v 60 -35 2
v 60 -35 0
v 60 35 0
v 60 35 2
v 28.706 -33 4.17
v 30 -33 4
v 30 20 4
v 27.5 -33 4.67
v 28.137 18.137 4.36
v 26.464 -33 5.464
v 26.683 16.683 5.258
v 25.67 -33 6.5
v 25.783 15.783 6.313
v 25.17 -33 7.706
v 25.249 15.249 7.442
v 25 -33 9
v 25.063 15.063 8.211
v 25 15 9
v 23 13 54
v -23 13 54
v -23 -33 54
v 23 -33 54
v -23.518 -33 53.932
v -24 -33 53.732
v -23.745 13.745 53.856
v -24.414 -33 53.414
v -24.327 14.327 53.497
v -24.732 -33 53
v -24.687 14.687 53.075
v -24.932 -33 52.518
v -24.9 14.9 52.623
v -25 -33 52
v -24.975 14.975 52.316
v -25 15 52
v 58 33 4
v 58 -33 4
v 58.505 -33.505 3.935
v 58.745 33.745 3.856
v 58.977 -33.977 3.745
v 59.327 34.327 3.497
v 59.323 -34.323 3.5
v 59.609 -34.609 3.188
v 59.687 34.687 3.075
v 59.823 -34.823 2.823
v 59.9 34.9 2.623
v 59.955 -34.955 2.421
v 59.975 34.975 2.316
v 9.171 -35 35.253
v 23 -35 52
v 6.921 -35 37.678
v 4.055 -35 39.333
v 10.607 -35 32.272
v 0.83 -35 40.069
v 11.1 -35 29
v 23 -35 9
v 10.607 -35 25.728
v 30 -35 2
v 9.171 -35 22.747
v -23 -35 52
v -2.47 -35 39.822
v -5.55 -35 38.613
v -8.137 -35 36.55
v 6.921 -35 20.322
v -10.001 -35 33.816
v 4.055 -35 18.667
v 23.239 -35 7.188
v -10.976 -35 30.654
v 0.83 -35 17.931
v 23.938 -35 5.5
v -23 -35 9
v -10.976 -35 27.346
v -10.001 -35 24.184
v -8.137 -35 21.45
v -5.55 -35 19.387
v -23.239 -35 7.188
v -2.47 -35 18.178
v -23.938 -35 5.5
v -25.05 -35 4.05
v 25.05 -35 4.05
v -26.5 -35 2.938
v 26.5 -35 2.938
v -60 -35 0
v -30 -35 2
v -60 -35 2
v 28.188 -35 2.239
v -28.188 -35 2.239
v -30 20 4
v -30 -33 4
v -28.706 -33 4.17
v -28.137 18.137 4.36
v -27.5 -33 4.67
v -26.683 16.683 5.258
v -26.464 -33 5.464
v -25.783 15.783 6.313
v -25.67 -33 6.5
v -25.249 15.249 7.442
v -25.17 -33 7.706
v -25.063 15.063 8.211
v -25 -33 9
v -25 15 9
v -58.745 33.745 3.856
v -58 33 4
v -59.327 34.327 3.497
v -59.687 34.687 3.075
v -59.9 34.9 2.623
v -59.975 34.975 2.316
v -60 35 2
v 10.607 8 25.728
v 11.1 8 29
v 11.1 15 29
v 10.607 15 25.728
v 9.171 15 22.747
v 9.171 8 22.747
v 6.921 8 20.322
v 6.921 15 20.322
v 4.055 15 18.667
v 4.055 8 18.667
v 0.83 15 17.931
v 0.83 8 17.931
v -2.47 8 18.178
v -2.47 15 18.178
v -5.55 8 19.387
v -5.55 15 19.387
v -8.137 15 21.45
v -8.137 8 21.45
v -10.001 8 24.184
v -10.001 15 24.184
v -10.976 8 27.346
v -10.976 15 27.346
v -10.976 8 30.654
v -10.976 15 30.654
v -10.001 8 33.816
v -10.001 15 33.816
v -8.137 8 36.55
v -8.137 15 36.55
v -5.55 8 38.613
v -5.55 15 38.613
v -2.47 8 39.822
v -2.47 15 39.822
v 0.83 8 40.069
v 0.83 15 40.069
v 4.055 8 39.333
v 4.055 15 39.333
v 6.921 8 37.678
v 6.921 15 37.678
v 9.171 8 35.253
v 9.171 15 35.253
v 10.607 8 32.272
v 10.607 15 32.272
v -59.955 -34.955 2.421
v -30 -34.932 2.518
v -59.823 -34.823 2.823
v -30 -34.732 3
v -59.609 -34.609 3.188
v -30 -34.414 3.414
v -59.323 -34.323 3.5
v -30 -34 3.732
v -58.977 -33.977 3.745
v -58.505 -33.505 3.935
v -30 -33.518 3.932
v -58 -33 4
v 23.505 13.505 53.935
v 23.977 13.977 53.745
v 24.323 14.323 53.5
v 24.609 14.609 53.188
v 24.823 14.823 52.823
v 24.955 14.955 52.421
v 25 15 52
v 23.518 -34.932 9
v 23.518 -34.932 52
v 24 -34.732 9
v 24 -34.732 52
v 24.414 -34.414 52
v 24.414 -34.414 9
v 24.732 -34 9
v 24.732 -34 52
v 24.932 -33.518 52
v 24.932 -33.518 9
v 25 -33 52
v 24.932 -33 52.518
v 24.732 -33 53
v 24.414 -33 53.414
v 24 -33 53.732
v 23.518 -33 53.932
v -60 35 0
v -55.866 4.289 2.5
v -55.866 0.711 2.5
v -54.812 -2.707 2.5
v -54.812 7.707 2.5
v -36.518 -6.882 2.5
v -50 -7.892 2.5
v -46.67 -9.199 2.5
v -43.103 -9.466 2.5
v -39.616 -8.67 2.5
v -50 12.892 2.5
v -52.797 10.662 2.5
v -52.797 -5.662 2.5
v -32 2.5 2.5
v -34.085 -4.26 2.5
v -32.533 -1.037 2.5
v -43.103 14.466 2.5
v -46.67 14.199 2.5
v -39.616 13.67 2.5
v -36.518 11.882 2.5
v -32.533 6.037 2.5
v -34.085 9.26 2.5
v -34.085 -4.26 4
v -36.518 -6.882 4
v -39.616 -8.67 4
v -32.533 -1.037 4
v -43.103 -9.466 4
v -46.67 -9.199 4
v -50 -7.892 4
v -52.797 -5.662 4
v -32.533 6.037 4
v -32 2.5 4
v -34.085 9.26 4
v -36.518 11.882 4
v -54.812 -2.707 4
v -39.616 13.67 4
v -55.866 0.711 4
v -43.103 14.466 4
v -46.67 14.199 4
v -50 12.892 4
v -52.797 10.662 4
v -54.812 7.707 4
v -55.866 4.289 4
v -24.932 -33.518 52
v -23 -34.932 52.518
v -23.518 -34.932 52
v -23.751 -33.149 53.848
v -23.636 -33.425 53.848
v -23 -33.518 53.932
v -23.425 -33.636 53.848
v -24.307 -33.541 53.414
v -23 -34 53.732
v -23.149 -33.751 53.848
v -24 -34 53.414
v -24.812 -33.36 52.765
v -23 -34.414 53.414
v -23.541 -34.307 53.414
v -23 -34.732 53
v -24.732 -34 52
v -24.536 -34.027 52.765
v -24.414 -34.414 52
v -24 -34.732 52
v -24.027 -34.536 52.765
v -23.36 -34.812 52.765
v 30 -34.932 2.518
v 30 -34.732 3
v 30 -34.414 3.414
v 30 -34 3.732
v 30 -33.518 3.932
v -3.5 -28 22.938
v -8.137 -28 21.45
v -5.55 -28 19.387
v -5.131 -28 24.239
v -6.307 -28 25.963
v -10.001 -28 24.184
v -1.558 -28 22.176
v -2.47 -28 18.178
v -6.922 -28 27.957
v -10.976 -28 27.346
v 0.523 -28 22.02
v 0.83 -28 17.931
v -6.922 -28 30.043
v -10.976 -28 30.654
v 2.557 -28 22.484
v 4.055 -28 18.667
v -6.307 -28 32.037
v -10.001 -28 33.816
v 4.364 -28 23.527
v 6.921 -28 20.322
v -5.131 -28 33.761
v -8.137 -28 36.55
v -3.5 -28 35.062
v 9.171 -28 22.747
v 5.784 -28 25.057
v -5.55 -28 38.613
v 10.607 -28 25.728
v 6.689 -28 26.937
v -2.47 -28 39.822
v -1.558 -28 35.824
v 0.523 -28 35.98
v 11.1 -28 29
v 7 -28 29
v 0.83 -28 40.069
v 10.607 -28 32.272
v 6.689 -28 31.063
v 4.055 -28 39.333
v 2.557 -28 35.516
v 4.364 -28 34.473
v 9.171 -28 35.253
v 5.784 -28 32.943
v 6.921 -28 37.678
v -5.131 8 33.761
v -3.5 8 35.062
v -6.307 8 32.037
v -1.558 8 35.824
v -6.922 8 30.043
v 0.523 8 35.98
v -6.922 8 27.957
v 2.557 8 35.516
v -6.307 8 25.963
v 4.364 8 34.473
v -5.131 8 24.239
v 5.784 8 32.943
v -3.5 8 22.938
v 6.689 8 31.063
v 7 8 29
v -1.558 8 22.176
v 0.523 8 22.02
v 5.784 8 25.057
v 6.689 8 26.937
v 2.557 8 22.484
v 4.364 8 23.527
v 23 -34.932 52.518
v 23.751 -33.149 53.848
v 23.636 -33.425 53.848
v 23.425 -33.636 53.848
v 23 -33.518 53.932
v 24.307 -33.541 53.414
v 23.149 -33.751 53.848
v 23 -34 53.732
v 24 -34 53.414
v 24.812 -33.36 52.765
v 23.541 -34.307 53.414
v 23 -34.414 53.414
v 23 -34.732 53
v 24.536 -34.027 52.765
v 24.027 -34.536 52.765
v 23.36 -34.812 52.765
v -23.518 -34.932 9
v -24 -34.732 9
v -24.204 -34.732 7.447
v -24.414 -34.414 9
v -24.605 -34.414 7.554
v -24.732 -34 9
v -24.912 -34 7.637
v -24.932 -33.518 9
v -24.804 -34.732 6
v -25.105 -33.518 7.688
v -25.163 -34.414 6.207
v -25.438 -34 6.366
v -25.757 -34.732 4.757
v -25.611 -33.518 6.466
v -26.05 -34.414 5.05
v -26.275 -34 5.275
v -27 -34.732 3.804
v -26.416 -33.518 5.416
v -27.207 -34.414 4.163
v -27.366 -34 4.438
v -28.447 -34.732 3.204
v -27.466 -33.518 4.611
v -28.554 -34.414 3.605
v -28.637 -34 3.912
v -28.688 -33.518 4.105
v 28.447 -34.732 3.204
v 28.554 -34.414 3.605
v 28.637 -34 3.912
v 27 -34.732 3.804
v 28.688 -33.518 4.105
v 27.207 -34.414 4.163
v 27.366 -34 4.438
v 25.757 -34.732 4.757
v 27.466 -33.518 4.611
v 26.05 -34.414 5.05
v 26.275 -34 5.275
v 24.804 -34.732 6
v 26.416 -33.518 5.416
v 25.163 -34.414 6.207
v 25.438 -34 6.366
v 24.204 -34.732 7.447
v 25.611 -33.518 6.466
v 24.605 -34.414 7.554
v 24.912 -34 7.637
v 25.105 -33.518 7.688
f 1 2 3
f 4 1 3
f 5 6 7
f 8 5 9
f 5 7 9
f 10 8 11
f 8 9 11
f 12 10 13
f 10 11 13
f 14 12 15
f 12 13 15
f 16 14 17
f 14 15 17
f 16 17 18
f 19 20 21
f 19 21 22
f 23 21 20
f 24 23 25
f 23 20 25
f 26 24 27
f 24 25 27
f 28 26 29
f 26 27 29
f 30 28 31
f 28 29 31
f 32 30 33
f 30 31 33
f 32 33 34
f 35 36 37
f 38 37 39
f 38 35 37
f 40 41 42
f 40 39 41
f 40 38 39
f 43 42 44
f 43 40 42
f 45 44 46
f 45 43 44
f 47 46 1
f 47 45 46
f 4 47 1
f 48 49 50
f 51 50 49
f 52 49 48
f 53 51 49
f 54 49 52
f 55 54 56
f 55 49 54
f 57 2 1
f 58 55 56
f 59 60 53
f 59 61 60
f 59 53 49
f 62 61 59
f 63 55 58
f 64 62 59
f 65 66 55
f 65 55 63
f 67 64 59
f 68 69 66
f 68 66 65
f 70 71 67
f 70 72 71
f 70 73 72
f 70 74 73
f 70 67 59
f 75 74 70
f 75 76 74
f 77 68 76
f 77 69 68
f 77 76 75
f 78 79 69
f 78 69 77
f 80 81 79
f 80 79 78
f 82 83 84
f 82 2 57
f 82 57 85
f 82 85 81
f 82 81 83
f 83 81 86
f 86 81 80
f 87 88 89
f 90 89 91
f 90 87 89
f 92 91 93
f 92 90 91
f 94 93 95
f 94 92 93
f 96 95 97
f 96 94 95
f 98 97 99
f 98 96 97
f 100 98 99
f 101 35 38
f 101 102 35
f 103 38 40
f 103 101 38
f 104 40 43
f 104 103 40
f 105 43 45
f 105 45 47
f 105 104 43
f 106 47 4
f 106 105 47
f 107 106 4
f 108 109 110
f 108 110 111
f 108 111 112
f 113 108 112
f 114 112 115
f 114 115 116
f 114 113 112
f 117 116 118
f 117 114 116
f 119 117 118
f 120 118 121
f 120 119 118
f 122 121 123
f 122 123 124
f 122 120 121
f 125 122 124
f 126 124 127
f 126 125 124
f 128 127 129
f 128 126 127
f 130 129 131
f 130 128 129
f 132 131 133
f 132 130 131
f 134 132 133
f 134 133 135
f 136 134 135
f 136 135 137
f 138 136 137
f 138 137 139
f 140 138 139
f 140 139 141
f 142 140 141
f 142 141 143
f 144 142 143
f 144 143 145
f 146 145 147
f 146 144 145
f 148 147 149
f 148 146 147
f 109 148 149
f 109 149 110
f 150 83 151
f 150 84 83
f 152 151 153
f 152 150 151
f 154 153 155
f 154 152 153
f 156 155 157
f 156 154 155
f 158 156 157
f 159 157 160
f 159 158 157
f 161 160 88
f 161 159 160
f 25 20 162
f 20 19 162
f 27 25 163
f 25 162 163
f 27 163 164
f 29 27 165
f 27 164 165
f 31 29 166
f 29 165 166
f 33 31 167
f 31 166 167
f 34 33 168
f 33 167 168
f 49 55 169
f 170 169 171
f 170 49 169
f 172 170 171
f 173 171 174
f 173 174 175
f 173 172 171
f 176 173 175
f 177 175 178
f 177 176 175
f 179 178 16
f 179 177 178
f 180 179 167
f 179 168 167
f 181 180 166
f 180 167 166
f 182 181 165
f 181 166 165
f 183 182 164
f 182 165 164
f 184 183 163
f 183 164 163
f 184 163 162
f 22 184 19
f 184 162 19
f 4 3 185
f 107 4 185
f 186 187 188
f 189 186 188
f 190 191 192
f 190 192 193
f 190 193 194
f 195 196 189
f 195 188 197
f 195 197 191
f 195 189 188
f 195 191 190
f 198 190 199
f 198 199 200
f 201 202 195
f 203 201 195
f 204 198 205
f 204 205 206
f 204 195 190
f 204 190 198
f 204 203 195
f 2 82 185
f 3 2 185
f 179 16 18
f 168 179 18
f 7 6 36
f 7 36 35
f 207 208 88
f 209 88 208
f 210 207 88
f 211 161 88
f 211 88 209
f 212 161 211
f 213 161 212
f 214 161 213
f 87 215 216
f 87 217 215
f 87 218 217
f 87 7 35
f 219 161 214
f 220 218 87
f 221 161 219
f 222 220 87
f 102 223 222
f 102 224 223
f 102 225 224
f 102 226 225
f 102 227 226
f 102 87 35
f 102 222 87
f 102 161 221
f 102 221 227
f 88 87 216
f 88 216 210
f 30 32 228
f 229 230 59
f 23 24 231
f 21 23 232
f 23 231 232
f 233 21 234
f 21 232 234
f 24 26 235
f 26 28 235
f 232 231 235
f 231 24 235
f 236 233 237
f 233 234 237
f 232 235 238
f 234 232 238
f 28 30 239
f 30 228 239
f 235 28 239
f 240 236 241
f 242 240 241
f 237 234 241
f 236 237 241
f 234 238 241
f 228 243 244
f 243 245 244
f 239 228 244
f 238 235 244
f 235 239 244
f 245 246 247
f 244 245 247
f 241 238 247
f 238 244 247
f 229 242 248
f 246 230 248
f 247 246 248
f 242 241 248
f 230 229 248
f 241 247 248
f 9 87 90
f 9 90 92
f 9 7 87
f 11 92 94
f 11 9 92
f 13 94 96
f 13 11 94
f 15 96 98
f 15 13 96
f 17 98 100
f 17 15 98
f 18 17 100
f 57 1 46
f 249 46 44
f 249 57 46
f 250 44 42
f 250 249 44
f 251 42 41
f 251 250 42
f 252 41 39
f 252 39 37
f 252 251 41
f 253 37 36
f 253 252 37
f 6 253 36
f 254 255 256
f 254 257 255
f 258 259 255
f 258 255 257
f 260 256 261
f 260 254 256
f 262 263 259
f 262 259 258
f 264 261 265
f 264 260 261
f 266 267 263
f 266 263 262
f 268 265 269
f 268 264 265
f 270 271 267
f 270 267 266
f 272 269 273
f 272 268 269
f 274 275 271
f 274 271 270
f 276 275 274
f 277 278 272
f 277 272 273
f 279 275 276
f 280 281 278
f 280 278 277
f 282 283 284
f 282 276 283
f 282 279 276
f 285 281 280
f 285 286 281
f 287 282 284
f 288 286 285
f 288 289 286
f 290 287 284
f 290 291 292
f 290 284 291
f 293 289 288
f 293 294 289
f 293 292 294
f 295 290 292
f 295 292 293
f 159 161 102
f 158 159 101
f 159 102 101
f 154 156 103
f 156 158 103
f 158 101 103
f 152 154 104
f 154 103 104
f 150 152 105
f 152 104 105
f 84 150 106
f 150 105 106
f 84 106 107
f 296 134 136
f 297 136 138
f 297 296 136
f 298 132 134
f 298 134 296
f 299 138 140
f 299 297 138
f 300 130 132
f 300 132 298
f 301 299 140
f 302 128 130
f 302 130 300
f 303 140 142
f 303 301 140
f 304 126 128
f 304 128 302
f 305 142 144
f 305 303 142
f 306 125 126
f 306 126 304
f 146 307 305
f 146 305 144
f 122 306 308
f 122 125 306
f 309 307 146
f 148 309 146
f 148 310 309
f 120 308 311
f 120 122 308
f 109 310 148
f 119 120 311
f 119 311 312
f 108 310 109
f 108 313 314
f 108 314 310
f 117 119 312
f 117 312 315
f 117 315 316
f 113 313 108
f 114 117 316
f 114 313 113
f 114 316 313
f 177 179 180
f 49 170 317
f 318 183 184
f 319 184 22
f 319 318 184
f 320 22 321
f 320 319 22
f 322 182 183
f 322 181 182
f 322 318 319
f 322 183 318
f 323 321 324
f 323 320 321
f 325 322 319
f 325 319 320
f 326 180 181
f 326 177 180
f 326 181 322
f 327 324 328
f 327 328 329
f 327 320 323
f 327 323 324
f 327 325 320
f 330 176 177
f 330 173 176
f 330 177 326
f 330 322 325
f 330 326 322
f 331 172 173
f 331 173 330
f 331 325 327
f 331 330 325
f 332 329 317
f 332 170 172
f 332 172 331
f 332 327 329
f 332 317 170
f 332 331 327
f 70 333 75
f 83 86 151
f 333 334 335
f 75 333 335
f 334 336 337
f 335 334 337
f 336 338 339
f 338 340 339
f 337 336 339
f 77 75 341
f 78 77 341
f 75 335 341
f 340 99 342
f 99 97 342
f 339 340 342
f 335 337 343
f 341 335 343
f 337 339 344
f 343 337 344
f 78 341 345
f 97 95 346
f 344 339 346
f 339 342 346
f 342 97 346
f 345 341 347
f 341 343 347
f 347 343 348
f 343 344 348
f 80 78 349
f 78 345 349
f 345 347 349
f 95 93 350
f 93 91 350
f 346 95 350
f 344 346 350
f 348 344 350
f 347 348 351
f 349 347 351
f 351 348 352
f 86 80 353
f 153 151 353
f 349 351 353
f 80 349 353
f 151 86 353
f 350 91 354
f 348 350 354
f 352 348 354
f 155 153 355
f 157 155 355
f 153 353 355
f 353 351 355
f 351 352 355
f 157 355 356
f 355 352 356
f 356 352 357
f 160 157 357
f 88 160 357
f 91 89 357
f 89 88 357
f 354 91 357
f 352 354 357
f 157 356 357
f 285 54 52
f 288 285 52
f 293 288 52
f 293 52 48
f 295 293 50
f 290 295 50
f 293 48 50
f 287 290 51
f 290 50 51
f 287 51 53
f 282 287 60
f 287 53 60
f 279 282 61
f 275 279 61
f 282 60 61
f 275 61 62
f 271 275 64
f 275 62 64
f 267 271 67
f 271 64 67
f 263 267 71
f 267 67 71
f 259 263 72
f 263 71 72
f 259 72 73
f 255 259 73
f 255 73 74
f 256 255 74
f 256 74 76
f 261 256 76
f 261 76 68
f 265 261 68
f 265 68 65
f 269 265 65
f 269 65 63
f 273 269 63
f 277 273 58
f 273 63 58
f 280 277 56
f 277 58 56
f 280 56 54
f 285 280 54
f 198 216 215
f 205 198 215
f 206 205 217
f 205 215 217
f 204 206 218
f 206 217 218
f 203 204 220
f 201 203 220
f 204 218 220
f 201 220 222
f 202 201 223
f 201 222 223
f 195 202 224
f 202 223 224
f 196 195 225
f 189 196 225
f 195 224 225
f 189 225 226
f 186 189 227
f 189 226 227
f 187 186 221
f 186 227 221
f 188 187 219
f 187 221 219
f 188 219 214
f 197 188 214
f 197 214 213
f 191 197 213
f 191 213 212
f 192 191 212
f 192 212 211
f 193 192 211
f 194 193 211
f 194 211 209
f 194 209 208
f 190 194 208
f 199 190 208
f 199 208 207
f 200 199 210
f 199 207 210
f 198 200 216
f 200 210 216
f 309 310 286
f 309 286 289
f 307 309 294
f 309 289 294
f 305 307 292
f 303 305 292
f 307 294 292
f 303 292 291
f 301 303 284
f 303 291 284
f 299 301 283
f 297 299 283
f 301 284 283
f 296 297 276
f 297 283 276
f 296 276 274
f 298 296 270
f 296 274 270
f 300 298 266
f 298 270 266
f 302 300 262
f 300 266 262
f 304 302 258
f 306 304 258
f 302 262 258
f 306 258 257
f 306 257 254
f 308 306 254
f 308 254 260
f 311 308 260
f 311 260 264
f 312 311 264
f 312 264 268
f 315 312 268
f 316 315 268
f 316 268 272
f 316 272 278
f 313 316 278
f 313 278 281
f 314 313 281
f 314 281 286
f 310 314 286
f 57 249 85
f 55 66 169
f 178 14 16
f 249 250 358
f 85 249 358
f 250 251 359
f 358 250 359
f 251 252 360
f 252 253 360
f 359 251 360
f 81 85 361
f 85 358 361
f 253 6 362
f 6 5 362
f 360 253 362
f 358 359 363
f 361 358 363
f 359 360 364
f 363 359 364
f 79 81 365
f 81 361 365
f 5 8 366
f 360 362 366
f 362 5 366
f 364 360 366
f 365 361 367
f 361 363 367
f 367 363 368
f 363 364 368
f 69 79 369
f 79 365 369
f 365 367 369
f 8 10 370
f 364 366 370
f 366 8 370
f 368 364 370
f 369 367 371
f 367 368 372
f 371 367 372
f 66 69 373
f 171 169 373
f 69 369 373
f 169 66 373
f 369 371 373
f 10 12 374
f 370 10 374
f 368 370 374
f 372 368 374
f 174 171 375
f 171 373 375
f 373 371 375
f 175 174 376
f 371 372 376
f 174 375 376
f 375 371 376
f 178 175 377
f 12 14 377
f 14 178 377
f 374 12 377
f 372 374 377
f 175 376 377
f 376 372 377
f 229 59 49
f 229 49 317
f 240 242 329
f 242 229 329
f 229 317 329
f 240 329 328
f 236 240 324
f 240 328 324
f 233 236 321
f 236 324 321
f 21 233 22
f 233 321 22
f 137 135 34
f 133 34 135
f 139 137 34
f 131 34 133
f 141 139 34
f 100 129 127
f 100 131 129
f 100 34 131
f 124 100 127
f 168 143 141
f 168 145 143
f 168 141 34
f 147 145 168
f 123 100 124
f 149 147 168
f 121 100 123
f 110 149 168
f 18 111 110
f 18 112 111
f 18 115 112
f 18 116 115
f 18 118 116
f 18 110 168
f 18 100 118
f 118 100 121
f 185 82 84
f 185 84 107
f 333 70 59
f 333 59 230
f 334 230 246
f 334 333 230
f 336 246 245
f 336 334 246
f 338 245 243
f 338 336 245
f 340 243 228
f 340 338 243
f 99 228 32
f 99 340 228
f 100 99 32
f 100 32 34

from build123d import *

# Parameters (mm, degrees)
SKETCH1_W           = 70
SKETCH1_H           = 120
BOSS_EXTRUDE1_DEPTH = 4
SKETCH2_W           = 50
SKETCH2_H           = 50
BOSS_EXTRUDE2_DEPTH = 50
SKETCH3_R           = 11.1
CUT_EXTRUDE1_DEPTH  = 7
SKETCH5_R           = 7
CUT_EXTRUDE3_DEPTH  = 103.396288995
CUT_EXTRUDE4_START  = -7
SKETCH6_R           = 11.1
CUT_EXTRUDE4_DEPTH  = 7
SKETCH7_R           = 12
CUT_EXTRUDE5_DEPTH  = 1.5
FILLET1_R           = 5
FILLET2_R           = 2


with BuildPart() as part:
    # Sketch1 → Boss-Extrude1 (new body)
    with BuildSketch(Plane(origin=(0, 0, 0), x_dir=(0, 1, 0), z_dir=(0, 0, 1))):
        Rectangle(SKETCH1_W, SKETCH1_H)
    extrude(amount=BOSS_EXTRUDE1_DEPTH)

    # Sketch2 → Boss-Extrude2 (add)
    with BuildSketch(Plane.XY.offset(4)):
        with Locations((0, -10)):
            Rectangle(SKETCH2_W, SKETCH2_H)
    extrude(amount=BOSS_EXTRUDE2_DEPTH)

    # Sketch3 → Cut-Extrude1 (cut)
    with BuildSketch(Plane.XZ.offset(35)):
        with Locations((0, 29)):
            Circle(SKETCH3_R)
    extrude(amount=-CUT_EXTRUDE1_DEPTH, mode=Mode.SUBTRACT)

    # Sketch5 → Cut-Extrude3 (cut, through all)
    with BuildSketch(Plane.XZ.offset(28)):
        with Locations((0, 29)):
            Circle(SKETCH5_R)
    extrude(amount=-CUT_EXTRUDE3_DEPTH, mode=Mode.SUBTRACT)

    # Sketch6 → Cut-Extrude4 (cut)
    with BuildSketch(Plane(origin=(0, 15, 0), x_dir=(-1, 0, 0), z_dir=(0, 1, 0)).offset(CUT_EXTRUDE4_START)):
        with Locations(Location((0, 29, 0), (0, 0, 180))):
            Circle(SKETCH6_R)
    extrude(amount=CUT_EXTRUDE4_DEPTH, mode=Mode.SUBTRACT)

    # Sketch7 → Cut-Extrude5 (cut)
    with BuildSketch(Plane.XY.offset(4)):
        with Locations((-44, 2.5)):
            Circle(SKETCH7_R)
    extrude(amount=-CUT_EXTRUDE5_DEPTH, mode=Mode.SUBTRACT)

    # Fillet1
    fillet1_edges = [part.edges().sort_by_distance(p)[0] for p in [
        (25, -10, 4),
        (0, 15, 4),
        (-25, -10, 4),
    ]]
    fillet(fillet1_edges, radius=FILLET1_R)

    # Fillet2
    fillet2_edges = [part.edges().sort_by_distance(p)[0] for p in [
        (-45, -35, 4),
        (25, -35, 31.5),
        (60, 0, 4),
        (-25, -35, 31.5),
        (25, -10, 54),
        (0, 15, 54),
        (-25, -10, 54),
        (0, -35, 54),
        (0, 35, 4),
        (45, -35, 4),
        (26.464466094, -35, 5.464466094),
        (-26.464466094, -35, 5.464466094),
        (-60, 0, 4),
    ]]
    fillet(fillet2_edges, radius=FILLET2_R)


solid = part.part
